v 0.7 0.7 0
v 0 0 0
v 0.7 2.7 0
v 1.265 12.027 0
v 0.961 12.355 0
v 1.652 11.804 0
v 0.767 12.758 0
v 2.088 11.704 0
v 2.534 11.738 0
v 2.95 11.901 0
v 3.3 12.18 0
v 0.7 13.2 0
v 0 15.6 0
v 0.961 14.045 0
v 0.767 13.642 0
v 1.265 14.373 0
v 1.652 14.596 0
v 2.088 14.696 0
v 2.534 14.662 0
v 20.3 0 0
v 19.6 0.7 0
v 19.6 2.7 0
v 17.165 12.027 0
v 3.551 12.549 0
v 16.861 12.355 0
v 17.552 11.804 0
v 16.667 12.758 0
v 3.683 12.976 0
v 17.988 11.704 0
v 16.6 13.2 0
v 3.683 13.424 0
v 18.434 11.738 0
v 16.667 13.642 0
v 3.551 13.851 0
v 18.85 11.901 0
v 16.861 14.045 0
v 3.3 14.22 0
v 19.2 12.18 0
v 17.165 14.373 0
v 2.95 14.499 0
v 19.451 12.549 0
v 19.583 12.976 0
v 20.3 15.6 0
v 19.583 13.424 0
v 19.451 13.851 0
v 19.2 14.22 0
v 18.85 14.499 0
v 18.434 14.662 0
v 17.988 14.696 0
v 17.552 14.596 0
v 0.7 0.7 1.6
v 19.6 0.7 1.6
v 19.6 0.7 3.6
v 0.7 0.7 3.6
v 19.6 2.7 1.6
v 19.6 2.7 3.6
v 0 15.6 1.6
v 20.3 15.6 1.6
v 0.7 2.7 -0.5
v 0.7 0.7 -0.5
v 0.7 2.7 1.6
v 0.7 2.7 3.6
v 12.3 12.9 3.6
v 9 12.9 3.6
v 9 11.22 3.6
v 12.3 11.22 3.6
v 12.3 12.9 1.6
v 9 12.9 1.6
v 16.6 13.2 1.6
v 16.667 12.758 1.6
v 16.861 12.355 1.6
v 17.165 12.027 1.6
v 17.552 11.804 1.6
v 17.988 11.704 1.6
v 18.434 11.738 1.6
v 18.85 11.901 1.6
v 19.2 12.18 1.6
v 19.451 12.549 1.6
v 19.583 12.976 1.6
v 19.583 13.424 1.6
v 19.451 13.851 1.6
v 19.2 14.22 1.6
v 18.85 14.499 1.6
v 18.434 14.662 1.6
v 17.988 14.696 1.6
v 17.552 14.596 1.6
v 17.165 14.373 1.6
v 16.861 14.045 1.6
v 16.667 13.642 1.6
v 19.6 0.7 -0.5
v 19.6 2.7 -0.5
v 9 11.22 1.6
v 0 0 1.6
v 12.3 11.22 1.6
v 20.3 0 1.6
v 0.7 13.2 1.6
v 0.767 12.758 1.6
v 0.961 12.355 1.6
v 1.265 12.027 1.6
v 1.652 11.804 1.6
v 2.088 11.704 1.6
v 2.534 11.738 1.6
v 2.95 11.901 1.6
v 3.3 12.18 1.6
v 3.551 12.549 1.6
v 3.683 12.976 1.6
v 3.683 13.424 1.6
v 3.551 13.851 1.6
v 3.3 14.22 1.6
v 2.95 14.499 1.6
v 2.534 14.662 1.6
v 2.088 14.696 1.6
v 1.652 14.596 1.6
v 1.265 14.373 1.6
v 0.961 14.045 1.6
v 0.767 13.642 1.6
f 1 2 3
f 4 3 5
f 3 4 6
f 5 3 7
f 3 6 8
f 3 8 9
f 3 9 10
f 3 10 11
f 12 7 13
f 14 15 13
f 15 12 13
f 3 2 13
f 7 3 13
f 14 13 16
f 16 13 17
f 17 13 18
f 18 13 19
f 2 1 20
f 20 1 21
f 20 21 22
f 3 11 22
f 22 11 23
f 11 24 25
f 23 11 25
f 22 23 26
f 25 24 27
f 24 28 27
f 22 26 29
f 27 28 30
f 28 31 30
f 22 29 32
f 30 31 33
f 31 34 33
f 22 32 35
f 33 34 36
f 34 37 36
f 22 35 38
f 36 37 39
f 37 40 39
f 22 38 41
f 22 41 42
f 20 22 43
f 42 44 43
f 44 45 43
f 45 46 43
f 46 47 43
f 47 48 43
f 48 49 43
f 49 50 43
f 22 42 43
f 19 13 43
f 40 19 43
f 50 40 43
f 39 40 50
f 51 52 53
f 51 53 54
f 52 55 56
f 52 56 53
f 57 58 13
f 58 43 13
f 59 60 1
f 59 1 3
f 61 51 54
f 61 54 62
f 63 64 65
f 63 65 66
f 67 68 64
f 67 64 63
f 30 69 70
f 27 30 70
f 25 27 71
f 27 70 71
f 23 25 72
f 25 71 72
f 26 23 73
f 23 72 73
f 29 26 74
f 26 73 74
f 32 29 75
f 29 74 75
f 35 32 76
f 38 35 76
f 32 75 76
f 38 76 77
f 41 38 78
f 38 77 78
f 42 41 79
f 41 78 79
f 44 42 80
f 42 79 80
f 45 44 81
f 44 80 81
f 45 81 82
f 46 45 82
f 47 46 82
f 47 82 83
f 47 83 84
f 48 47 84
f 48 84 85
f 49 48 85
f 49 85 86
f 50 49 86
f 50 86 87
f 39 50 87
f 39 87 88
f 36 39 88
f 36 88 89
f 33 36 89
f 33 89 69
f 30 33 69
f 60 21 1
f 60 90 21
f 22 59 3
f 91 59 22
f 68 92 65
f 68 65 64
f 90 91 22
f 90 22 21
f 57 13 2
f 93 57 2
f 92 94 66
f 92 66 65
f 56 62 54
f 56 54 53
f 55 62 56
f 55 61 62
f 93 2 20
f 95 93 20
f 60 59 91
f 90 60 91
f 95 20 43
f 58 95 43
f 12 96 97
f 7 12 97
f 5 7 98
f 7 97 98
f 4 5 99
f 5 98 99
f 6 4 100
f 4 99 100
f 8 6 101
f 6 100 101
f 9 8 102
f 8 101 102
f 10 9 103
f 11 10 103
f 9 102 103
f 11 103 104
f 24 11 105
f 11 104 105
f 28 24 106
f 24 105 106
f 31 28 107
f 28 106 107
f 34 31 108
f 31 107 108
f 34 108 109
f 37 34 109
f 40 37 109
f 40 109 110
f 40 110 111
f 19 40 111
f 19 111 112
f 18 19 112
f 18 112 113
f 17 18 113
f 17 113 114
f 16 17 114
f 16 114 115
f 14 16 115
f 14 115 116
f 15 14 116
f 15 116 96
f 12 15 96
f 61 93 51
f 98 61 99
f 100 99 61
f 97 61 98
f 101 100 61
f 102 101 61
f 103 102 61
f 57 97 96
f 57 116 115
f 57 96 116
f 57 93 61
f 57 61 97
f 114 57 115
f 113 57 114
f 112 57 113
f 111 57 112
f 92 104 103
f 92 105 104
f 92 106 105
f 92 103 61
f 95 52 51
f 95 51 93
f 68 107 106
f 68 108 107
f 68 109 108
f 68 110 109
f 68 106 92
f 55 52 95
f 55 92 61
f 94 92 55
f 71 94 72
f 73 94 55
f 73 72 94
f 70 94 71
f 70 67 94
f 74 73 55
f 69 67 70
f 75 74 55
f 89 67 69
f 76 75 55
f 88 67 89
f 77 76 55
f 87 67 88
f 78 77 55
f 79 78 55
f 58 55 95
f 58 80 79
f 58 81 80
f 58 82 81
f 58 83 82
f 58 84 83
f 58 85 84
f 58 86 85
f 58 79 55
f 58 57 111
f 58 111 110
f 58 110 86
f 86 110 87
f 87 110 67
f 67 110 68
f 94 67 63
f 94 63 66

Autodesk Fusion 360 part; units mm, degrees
sketch "Sketch1" plane through (0, 0, 0) normal (0, 0, 1) x (1, 0, 0)
  line L0 (0, 0) -> (20.3, 0)
  line L1 (20.3, 0) -> (20.3, 15.6)
  line L2 (20.3, 15.6) -> (0, 15.6)
  line L3 (0, 15.6) -> (0, 0)
  line L4 (9, 12.9) -> (12.3, 12.9)
  line L5 (12.3, 12.9) -> (12.3, 11.22)
  line L6 (12.3, 11.22) -> (9, 11.22)
  line L7 (9, 11.22) -> (9, 12.9)
  line L8 (0.7, 2.7) -> (19.6, 2.7)
  line L9 (19.6, 2.7) -> (19.6, 0.7)
  line L10 (19.6, 0.7) -> (0.7, 0.7)
  line L11 (0.7, 0.7) -> (0.7, 2.7)
  dimension "d1" = 20.3
  dimension "d2" = 15.6
  dimension "d3" = 3.3
  dimension "d4" = 1.68
  dimension "d5" = 2.7
  dimension "d6" = 8
  dimension "d7" = 0.7
  dimension "d8" = 2
  dimension "d9" = 0.7
  dimension "d10" = 0.7
extrude "Extrude1" add sketch "Sketch1" along normal blind 1.6 contours L0 L1 L2 L3 | L4 L5 L6 L7 | L8 L9 L10 L11
extrude "Extrude2" add sketch "Sketch1" along normal blind 3.6 contours L4 L5 L6 L7
extrude "Extrude3" add sketch "Sketch1" along normal blind 3.6 and the other way blind 0.5 contours L8 L9 L10 L11
sketch "Sketch2" plane through (0, 0, 1.6) normal (0, 0, 1) x (-1, 0, 0)
  line L0 (-0.7, -0.7) -> (-0.7, -2.7)
  line L1 (-0.7, -2.7) -> (-19.6, -2.7)
  line L2 (-19.6, -2.7) -> (-19.6, -0.7)
  line L3 (-19.6, -0.7) -> (-0.7, -0.7)
  line L4 (-9, -11.22) -> (-9, -12.9)
  line L5 (-9, -12.9) -> (-12.3, -12.9)
  line L6 (-12.3, -12.9) -> (-12.3, -11.22)
  line L7 (-12.3, -11.22) -> (-9, -11.22)
  line L8 (0, -15.6) -> (0, 0)
  line L9 (0, 0) -> (-20.3, 0)
  line L10 (-20.3, 0) -> (-20.3, -15.6)
  line L11 (-20.3, -15.6) -> (0, -15.6)
  circle A0 centre (-2.2, -13.2) radius 1.5
  line L12 (-20.3, -15.6) -> (0, -15.6)
  line L13 (0, -15.6) -> (0, 0)
  line L14 (-10.15, -15.6) -> (-10.15, -9.9904) construction
  circle A1 centre (-18.1, -13.2) radius 1.5
  dimension "d19" = 3
  dimension "d21" = 2.4
  dimension "d22" = 2.2
extrude "Extrude4" cut sketch "Sketch2" against normal through all contours A0 | A1
equation "d21 = 0.9 mm + ( d19 / 2 )"
equation "d22 = 0.7 mm + ( d19 / 2 )"
